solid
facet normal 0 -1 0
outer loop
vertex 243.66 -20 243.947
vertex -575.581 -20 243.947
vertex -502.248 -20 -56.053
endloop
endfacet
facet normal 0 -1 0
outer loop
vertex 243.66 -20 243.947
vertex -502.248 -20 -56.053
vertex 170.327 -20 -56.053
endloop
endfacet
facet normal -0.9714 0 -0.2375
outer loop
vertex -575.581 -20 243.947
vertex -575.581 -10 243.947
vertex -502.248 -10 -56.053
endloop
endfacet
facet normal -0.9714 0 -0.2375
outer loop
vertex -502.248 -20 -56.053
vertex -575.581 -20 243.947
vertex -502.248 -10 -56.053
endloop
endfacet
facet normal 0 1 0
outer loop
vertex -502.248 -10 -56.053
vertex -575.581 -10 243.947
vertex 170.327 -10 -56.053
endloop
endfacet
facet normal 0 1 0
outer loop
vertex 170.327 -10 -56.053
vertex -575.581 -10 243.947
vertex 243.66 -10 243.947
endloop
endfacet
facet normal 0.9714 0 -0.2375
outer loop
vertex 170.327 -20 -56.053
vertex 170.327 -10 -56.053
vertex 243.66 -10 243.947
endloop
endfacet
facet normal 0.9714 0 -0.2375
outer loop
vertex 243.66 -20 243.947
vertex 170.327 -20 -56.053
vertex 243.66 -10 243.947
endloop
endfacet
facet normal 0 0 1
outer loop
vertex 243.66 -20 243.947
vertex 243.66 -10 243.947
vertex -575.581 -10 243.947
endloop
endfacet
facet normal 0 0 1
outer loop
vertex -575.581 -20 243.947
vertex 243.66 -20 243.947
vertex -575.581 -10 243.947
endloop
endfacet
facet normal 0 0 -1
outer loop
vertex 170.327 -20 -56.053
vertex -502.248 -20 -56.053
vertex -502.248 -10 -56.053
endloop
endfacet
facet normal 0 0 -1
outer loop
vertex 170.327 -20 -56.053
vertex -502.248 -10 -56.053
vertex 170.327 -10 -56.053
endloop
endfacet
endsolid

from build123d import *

# Parameters (mm, degrees)
F0_W     = 540
F0_H     = 390
F1_DEPTH = 10
F3_DEPTH = 10
F4_DEPTH = 10.001
F5_DEPTH = 10


with BuildPart() as f1:
    # F0 (on Front) → F1 (new body)
    with BuildSketch(Plane.XZ):
        Polygon((-575.5810141563, 243.9473703504), (-465.5810141563, -206.0526296496), (133.660423523, -206.0526296496), (243.660423523, 243.9473703504), (133.660423523, 243.9473703504), (-465.5810141563, 243.9473703504), align=None)
        with Locations((-166.339576477, 18.9473703504)):
            Rectangle(F0_W, F0_H, mode=Mode.SUBTRACT)
        Polygon((-495.5810141563, 43.0153865893), (-537.3643879646, 213.9473703504), (-495.5810141563, 213.9473703504), align=None, mode=Mode.SUBTRACT)
        Polygon((163.660423523, 213.9473703504), (205.4437973313, 213.9473703504), (163.660423523, 43.0153865893), align=None, mode=Mode.SUBTRACT)
    extrude(amount=F1_DEPTH)

    # F2 (on face) → F3 (join)
    with BuildSketch(Plane.XZ.offset(10)):
        Polygon((-436.339576477, 213.9473703504), (-436.339576477, -56.0526296496), (-237.4058812857, -56.0526296496), (103.660423523, -56.0526296496), (103.660423523, 213.9473703504), align=None)
        Polygon((-237.4058812857, 243.9473703504), (-575.5810141563, 243.9473703504), (-502.247680823, -56.0526296496), (-436.339576477, -56.0526296496), (-436.339576477, 213.9473703504), (103.660423523, 213.9473703504), (103.660423523, -56.0526296496), (170.3270901897, -56.0526296496), (243.660423523, 243.9473703504), align=None)
        Polygon((-495.5810141563, 213.9473703504), (-495.5810141563, 43.0153865893), (-537.3643879646, 213.9473703504), align=None, mode=Mode.SUBTRACT)
        Polygon((163.660423523, 43.0153865893), (163.660423523, 213.9473703504), (205.4437973313, 213.9473703504), align=None, mode=Mode.SUBTRACT)
        Polygon((-537.3643879646, 213.9473703504), (-495.5810141563, 43.0153865893), (-495.5810141563, 213.9473703504), align=None)
        Polygon((205.4437973313, 213.9473703504), (163.660423523, 213.9473703504), (163.660423523, 43.0153865893), align=None)
    extrude(amount=F3_DEPTH)

    # F4 (cut, through all): a face of the model
    f4_faces = [f1.faces().sort_by_distance(p)[0] for p in [
        (-469.29362865, -10, -62.9436152294),
    ]]
    extrude(f4_faces, amount=-F4_DEPTH, mode=Mode.SUBTRACT)

    # F0 (on Front) → F5 (cut)
    with BuildSketch(Plane.XZ):
        Polygon((-575.5810141563, 243.9473703504), (-465.5810141563, -206.0526296496), (133.660423523, -206.0526296496), (243.660423523, 243.9473703504), (133.660423523, 243.9473703504), (-465.5810141563, 243.9473703504), align=None)
        with Locations((-166.339576477, 18.9473703504)):
            Rectangle(F0_W, F0_H, mode=Mode.SUBTRACT)
        Polygon((-495.5810141563, 43.0153865893), (-537.3643879646, 213.9473703504), (-495.5810141563, 213.9473703504), align=None, mode=Mode.SUBTRACT)
        Polygon((163.660423523, 213.9473703504), (205.4437973313, 213.9473703504), (163.660423523, 43.0153865893), align=None, mode=Mode.SUBTRACT)
    extrude(amount=F5_DEPTH, mode=Mode.SUBTRACT)


solid = f1.part
